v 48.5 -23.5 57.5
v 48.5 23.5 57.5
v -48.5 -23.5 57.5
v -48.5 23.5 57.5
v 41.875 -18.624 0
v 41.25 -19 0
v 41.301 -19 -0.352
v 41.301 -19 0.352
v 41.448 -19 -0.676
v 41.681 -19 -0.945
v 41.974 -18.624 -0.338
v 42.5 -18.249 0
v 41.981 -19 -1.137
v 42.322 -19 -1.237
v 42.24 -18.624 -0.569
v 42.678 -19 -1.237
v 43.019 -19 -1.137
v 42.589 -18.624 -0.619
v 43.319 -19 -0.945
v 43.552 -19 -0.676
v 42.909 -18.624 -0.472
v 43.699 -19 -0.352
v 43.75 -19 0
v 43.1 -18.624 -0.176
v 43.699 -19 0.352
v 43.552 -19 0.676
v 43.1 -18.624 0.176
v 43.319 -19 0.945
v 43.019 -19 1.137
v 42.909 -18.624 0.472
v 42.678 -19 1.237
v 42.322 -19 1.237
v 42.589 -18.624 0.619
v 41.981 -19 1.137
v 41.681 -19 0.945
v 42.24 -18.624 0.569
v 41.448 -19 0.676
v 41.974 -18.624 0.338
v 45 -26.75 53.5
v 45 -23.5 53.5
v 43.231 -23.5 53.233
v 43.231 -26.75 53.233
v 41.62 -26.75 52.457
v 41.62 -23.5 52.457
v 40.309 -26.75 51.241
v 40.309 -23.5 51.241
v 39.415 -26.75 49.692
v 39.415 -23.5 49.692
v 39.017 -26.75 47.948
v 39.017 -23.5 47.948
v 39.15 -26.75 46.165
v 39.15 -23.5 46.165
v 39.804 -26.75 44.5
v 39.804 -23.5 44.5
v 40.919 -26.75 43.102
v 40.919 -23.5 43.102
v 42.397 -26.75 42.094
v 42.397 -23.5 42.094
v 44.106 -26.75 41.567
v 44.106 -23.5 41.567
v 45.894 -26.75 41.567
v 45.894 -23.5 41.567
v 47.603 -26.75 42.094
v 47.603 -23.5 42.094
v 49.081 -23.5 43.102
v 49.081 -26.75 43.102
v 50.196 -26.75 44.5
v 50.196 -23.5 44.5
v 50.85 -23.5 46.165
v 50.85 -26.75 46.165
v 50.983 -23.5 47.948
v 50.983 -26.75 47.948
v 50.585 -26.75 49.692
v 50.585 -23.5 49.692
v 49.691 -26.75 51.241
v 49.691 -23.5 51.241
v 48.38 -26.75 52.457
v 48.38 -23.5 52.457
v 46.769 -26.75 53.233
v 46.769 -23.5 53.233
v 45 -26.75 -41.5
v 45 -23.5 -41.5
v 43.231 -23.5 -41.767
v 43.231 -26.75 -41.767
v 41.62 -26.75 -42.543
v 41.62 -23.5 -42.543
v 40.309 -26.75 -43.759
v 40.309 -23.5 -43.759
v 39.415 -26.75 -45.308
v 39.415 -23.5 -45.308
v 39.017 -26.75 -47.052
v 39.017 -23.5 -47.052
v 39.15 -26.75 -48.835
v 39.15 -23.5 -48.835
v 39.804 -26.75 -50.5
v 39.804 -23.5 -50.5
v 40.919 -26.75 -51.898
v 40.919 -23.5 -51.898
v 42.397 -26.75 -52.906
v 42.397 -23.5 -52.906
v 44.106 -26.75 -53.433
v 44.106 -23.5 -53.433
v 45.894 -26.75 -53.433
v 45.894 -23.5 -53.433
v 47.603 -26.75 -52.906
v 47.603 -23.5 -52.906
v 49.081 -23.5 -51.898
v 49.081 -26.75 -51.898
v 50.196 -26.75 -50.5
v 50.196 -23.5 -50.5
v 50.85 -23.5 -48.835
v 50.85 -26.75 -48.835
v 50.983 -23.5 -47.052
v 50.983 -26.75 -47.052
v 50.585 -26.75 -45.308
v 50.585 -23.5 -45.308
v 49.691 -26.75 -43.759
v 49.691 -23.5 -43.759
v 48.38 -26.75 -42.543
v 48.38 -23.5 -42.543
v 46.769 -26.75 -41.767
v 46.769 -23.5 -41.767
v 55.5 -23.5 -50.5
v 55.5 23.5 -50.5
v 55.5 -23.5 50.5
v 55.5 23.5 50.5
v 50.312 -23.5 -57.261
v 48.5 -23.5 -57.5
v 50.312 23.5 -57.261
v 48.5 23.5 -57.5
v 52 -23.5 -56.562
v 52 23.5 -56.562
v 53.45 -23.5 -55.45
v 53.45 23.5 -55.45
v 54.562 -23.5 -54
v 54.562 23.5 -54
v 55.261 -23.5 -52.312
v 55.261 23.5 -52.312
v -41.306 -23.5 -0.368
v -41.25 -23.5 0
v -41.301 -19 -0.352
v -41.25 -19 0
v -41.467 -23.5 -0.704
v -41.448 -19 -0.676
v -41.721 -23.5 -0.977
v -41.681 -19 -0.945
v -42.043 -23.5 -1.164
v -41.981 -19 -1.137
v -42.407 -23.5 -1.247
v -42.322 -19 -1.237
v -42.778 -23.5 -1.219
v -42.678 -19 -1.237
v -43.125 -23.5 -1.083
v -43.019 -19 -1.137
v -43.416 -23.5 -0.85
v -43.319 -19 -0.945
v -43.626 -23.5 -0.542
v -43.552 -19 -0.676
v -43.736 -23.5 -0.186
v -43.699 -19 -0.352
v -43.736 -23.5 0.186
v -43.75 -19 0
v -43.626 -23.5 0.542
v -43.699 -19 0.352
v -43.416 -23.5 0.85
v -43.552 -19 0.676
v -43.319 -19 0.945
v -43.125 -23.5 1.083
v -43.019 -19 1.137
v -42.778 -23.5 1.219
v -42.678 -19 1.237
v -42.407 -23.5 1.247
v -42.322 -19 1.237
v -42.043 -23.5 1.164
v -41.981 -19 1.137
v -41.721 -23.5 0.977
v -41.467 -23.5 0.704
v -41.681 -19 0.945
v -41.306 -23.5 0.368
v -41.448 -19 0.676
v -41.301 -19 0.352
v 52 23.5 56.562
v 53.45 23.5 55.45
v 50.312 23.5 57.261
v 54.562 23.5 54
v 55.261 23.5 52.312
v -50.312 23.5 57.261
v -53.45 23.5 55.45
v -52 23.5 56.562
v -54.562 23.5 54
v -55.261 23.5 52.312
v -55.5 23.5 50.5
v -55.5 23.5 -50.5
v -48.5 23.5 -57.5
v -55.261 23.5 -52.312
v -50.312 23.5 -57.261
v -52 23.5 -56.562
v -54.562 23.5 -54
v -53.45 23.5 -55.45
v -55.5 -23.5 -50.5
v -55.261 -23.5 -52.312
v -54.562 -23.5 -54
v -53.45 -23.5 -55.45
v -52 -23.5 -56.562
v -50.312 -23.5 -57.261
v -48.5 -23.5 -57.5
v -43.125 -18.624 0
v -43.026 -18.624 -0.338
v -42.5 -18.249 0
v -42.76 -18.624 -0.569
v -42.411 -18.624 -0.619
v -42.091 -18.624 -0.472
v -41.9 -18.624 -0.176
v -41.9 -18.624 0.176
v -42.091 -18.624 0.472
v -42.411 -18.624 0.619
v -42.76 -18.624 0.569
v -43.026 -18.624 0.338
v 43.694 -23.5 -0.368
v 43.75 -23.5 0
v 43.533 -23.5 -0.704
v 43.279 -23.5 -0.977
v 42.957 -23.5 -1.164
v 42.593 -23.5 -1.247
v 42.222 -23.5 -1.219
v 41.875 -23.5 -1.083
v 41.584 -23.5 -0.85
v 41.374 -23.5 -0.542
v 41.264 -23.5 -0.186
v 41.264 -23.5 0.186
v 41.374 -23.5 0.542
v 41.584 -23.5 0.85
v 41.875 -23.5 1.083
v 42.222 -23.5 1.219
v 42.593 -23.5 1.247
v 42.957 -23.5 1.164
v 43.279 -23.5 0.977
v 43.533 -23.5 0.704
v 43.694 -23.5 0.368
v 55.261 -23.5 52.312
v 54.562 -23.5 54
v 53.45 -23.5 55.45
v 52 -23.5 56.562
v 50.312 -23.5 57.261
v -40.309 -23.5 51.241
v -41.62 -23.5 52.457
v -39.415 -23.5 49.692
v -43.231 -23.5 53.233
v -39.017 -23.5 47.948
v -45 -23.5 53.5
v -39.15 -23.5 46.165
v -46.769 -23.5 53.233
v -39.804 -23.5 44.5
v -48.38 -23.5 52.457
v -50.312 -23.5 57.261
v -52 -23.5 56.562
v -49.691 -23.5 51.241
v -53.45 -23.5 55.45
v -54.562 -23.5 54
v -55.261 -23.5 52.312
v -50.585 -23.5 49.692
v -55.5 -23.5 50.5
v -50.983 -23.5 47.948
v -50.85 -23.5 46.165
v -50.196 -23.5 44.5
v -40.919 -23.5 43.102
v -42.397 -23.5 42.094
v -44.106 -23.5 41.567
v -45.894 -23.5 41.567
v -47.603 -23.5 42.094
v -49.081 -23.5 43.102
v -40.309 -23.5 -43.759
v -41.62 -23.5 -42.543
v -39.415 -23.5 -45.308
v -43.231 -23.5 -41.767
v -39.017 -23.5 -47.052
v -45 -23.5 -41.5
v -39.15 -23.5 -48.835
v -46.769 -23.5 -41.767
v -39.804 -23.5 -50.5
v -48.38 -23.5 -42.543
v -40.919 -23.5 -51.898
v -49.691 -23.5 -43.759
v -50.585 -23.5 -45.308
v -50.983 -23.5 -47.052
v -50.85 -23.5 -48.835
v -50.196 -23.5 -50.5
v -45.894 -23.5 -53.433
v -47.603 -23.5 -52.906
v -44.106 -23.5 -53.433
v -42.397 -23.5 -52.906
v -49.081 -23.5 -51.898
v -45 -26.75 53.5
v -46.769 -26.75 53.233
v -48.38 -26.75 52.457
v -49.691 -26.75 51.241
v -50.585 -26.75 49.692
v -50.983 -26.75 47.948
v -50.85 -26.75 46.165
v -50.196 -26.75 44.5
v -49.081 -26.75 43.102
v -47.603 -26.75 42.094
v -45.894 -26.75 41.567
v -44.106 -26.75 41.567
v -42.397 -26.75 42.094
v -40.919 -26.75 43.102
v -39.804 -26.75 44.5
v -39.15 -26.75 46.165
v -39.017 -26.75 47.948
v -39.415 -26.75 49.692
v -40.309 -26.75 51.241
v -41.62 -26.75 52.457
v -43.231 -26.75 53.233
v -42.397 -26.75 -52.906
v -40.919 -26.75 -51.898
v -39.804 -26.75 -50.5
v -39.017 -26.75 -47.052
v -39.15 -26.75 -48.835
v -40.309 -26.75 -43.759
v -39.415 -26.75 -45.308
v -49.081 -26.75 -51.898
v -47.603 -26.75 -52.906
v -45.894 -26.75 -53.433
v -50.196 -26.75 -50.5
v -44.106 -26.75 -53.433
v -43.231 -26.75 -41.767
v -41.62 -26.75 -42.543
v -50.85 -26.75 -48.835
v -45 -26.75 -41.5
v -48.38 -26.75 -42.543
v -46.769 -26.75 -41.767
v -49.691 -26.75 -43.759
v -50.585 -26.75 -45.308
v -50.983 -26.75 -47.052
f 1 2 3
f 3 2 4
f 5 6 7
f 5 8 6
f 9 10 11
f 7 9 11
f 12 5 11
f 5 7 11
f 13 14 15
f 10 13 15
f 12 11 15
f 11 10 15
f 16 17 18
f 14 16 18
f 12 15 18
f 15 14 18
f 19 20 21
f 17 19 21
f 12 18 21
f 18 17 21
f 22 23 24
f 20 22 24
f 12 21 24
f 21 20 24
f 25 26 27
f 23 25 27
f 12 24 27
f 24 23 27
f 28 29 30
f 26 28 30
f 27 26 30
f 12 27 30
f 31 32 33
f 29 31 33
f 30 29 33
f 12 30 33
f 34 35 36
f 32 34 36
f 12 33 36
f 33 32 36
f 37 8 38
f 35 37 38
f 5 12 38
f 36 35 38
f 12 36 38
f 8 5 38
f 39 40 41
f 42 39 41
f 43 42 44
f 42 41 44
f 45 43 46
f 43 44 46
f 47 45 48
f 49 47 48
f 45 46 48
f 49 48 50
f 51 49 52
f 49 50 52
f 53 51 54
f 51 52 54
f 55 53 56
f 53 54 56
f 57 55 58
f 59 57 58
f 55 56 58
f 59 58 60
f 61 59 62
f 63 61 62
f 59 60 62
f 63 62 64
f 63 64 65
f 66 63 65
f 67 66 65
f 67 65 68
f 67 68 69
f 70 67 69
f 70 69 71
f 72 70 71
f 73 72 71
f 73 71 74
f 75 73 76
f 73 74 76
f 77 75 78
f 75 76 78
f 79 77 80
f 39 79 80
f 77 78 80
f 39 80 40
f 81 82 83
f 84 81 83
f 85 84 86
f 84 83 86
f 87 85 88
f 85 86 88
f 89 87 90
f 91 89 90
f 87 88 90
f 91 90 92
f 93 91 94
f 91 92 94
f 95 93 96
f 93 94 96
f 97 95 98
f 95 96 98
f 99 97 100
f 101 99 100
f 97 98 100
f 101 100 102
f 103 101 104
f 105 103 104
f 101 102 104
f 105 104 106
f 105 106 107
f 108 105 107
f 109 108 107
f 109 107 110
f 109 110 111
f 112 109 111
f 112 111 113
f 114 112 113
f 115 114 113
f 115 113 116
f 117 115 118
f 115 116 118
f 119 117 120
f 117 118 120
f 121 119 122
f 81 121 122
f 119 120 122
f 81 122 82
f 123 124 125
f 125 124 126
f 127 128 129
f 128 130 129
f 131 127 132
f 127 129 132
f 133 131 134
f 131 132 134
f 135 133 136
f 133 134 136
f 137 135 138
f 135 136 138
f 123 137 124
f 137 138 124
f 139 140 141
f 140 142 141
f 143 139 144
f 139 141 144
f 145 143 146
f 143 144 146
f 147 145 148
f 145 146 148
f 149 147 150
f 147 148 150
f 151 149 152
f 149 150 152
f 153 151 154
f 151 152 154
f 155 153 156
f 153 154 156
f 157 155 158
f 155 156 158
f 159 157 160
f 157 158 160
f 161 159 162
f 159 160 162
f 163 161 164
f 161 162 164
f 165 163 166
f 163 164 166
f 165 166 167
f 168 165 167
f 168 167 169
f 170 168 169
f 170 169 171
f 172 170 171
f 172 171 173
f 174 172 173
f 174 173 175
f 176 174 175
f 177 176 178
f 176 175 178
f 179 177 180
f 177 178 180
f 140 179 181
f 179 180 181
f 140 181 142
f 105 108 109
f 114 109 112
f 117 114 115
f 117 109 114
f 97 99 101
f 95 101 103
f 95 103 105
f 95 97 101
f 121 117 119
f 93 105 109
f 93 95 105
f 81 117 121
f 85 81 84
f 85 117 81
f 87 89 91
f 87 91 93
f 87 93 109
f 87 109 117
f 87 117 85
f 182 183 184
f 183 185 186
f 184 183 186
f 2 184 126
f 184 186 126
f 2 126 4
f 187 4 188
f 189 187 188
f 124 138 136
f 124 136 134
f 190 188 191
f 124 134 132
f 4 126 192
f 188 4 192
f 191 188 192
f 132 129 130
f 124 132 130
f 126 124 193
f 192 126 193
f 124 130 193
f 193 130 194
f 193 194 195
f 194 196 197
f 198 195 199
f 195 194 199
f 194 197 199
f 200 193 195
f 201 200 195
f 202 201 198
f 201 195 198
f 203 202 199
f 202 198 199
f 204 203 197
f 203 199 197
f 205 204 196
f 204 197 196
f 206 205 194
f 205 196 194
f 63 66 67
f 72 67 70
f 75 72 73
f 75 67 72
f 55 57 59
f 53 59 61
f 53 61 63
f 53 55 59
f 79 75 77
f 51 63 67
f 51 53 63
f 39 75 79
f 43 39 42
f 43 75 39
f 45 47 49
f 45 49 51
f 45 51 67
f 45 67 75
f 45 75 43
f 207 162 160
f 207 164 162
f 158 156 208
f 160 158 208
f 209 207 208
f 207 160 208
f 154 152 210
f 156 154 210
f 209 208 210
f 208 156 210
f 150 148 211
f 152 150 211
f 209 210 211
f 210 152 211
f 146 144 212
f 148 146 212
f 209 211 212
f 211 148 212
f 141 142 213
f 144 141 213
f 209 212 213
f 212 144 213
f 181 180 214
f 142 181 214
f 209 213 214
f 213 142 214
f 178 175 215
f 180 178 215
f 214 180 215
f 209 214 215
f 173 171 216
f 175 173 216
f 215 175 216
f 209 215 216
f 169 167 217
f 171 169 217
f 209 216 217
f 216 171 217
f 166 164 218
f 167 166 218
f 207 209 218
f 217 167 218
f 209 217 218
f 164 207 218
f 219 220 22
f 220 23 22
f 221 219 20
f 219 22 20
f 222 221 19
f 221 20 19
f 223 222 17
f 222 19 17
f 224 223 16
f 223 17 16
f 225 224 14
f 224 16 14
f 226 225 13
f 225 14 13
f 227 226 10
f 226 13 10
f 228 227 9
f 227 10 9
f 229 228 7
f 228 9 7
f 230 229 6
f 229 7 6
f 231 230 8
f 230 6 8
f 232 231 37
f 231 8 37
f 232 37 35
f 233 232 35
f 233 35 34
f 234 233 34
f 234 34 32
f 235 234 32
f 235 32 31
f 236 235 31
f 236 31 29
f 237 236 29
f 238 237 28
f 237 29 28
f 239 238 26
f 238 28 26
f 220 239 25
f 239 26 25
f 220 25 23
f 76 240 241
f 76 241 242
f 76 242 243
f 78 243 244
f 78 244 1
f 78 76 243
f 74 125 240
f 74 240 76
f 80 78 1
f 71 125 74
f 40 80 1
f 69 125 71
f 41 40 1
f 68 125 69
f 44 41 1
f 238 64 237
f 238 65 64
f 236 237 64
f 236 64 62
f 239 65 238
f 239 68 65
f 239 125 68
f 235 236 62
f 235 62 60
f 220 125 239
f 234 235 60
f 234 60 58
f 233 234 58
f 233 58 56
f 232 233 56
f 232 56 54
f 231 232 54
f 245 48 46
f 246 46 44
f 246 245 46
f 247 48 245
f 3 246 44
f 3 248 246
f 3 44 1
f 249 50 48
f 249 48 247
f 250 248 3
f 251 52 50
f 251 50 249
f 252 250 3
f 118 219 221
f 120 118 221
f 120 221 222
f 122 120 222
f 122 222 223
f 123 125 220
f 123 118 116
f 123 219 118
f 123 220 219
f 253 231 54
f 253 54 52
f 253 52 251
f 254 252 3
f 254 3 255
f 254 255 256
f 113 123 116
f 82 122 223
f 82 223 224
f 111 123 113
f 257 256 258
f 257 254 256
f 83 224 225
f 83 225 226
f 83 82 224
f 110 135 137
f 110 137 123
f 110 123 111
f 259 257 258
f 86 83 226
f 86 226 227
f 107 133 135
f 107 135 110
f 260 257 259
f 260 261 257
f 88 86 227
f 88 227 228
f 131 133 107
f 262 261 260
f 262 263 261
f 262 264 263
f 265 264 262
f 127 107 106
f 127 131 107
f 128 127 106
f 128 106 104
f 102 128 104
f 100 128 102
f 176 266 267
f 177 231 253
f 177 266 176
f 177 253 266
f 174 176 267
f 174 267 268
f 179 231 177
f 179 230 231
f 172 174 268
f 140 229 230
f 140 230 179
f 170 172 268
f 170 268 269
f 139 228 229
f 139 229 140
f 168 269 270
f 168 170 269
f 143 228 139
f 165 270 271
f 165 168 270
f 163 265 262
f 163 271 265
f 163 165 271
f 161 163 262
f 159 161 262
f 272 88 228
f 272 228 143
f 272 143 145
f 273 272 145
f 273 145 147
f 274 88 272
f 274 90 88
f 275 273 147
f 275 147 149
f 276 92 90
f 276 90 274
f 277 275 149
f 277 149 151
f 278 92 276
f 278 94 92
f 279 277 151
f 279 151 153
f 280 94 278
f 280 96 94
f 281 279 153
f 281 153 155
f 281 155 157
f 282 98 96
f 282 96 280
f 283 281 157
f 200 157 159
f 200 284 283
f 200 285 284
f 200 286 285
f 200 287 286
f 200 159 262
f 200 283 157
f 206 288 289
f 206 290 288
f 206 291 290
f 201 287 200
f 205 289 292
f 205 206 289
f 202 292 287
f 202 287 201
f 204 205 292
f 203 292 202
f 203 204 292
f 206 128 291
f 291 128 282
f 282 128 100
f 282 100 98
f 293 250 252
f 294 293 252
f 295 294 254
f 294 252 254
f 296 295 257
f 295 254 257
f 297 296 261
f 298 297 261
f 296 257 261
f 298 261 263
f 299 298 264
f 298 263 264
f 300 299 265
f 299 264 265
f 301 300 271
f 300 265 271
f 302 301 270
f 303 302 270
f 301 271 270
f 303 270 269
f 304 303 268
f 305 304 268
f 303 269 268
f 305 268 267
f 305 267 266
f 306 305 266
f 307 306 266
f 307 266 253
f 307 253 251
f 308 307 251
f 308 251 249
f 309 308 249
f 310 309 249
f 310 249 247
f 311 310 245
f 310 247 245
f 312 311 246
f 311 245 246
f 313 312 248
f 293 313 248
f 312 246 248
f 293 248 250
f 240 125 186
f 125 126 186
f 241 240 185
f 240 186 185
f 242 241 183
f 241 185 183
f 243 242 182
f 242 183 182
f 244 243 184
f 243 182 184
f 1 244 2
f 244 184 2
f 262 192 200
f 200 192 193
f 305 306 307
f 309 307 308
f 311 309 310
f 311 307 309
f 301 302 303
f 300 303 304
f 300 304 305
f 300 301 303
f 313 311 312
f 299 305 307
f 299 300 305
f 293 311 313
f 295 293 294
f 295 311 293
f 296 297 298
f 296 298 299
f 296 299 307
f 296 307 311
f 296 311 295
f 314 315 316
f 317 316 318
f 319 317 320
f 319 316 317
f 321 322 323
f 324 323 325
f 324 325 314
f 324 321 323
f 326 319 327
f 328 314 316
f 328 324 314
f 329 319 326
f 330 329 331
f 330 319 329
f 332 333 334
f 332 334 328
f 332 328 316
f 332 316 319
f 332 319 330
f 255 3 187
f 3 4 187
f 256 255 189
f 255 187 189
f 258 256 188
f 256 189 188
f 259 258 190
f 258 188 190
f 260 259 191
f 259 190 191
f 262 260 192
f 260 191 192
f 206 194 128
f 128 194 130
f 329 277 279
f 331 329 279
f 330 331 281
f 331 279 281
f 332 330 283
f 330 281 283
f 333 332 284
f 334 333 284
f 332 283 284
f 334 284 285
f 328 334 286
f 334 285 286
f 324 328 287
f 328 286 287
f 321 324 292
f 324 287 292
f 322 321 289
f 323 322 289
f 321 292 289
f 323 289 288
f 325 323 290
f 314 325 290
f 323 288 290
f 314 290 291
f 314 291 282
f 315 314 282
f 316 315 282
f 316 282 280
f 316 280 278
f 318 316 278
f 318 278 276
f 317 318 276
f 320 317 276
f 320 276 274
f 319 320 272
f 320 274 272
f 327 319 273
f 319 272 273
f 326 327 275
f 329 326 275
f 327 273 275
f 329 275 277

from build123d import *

# Parameters (mm, degrees)
BOSS_EXTRUDE1_DEPTH       = 23.5
SKETCH4_R                 = 6
BOSS_EXTRUDE2_DEPTH       = 3.25
M3X0_5_TAPPED_HOLE1_D     = 2.5
M3X0_5_TAPPED_HOLE1_DEPTH = 4.5
M3X0_5_TAPPED_HOLE1_TIP   = 0.751075774


with BuildPart() as part:
    # Sketch3 → Boss-Extrude1 (new, symmetric)
    with BuildSketch(Plane(origin=(0, 0, 0), x_dir=(1, 0, 0), z_dir=(0, 1, 0))):
        with BuildLine():
            Line((-48.5, 57.5), (48.5, 57.5))
            ThreePointArc((48.5, 57.5), (53.449747468, 55.449747468), (55.5, 50.5))
            Line((55.5, 50.5), (55.5, -50.5))
            ThreePointArc((55.5, -50.5), (53.449747468, -55.449747468), (48.5, -57.5))
            Line((48.5, -57.5), (-48.5, -57.5))
            ThreePointArc((-48.5, -57.5), (-53.449747468, -55.449747468), (-55.5, -50.5))
            Line((-55.5, -50.5), (-55.5, 50.5))
            ThreePointArc((-55.5, 50.5), (-53.449747468, 55.449747468), (-48.5, 57.5))
        make_face()
    extrude(amount=BOSS_EXTRUDE1_DEPTH, both=True)

    # Sketch4 → Boss-Extrude2 (add)
    with BuildSketch(Plane.XZ.offset(23.5)):
        with Locations(Location((45, 47.5, 0), (0, 0, 90))):
            Circle(SKETCH4_R)
        with Locations(Location((-45, 47.5, 0), (0, 0, 90))):
            Circle(SKETCH4_R)
        with Locations(Location((-45, -47.5, 0), (0, 0, 90))):
            Circle(SKETCH4_R)
        with Locations(Location((45, -47.5, 0), (0, 0, 90))):
            Circle(SKETCH4_R)
    extrude(amount=BOSS_EXTRUDE2_DEPTH)

    # M3x0.5 Tapped Hole1
    with Locations(Plane(origin=(0, -23.5, 0), x_dir=(-1, 0, 0), z_dir=(0, -1, 0))):
        with Locations((-42.5, 0), (42.5, 0)):
            Hole(M3X0_5_TAPPED_HOLE1_D / 2, depth=M3X0_5_TAPPED_HOLE1_DEPTH)
            with Locations((0, 0, -(M3X0_5_TAPPED_HOLE1_DEPTH + M3X0_5_TAPPED_HOLE1_TIP / 2))):  # 118° drill point
                Cone(0, M3X0_5_TAPPED_HOLE1_D / 2, M3X0_5_TAPPED_HOLE1_TIP, mode=Mode.SUBTRACT)


solid = part.part
